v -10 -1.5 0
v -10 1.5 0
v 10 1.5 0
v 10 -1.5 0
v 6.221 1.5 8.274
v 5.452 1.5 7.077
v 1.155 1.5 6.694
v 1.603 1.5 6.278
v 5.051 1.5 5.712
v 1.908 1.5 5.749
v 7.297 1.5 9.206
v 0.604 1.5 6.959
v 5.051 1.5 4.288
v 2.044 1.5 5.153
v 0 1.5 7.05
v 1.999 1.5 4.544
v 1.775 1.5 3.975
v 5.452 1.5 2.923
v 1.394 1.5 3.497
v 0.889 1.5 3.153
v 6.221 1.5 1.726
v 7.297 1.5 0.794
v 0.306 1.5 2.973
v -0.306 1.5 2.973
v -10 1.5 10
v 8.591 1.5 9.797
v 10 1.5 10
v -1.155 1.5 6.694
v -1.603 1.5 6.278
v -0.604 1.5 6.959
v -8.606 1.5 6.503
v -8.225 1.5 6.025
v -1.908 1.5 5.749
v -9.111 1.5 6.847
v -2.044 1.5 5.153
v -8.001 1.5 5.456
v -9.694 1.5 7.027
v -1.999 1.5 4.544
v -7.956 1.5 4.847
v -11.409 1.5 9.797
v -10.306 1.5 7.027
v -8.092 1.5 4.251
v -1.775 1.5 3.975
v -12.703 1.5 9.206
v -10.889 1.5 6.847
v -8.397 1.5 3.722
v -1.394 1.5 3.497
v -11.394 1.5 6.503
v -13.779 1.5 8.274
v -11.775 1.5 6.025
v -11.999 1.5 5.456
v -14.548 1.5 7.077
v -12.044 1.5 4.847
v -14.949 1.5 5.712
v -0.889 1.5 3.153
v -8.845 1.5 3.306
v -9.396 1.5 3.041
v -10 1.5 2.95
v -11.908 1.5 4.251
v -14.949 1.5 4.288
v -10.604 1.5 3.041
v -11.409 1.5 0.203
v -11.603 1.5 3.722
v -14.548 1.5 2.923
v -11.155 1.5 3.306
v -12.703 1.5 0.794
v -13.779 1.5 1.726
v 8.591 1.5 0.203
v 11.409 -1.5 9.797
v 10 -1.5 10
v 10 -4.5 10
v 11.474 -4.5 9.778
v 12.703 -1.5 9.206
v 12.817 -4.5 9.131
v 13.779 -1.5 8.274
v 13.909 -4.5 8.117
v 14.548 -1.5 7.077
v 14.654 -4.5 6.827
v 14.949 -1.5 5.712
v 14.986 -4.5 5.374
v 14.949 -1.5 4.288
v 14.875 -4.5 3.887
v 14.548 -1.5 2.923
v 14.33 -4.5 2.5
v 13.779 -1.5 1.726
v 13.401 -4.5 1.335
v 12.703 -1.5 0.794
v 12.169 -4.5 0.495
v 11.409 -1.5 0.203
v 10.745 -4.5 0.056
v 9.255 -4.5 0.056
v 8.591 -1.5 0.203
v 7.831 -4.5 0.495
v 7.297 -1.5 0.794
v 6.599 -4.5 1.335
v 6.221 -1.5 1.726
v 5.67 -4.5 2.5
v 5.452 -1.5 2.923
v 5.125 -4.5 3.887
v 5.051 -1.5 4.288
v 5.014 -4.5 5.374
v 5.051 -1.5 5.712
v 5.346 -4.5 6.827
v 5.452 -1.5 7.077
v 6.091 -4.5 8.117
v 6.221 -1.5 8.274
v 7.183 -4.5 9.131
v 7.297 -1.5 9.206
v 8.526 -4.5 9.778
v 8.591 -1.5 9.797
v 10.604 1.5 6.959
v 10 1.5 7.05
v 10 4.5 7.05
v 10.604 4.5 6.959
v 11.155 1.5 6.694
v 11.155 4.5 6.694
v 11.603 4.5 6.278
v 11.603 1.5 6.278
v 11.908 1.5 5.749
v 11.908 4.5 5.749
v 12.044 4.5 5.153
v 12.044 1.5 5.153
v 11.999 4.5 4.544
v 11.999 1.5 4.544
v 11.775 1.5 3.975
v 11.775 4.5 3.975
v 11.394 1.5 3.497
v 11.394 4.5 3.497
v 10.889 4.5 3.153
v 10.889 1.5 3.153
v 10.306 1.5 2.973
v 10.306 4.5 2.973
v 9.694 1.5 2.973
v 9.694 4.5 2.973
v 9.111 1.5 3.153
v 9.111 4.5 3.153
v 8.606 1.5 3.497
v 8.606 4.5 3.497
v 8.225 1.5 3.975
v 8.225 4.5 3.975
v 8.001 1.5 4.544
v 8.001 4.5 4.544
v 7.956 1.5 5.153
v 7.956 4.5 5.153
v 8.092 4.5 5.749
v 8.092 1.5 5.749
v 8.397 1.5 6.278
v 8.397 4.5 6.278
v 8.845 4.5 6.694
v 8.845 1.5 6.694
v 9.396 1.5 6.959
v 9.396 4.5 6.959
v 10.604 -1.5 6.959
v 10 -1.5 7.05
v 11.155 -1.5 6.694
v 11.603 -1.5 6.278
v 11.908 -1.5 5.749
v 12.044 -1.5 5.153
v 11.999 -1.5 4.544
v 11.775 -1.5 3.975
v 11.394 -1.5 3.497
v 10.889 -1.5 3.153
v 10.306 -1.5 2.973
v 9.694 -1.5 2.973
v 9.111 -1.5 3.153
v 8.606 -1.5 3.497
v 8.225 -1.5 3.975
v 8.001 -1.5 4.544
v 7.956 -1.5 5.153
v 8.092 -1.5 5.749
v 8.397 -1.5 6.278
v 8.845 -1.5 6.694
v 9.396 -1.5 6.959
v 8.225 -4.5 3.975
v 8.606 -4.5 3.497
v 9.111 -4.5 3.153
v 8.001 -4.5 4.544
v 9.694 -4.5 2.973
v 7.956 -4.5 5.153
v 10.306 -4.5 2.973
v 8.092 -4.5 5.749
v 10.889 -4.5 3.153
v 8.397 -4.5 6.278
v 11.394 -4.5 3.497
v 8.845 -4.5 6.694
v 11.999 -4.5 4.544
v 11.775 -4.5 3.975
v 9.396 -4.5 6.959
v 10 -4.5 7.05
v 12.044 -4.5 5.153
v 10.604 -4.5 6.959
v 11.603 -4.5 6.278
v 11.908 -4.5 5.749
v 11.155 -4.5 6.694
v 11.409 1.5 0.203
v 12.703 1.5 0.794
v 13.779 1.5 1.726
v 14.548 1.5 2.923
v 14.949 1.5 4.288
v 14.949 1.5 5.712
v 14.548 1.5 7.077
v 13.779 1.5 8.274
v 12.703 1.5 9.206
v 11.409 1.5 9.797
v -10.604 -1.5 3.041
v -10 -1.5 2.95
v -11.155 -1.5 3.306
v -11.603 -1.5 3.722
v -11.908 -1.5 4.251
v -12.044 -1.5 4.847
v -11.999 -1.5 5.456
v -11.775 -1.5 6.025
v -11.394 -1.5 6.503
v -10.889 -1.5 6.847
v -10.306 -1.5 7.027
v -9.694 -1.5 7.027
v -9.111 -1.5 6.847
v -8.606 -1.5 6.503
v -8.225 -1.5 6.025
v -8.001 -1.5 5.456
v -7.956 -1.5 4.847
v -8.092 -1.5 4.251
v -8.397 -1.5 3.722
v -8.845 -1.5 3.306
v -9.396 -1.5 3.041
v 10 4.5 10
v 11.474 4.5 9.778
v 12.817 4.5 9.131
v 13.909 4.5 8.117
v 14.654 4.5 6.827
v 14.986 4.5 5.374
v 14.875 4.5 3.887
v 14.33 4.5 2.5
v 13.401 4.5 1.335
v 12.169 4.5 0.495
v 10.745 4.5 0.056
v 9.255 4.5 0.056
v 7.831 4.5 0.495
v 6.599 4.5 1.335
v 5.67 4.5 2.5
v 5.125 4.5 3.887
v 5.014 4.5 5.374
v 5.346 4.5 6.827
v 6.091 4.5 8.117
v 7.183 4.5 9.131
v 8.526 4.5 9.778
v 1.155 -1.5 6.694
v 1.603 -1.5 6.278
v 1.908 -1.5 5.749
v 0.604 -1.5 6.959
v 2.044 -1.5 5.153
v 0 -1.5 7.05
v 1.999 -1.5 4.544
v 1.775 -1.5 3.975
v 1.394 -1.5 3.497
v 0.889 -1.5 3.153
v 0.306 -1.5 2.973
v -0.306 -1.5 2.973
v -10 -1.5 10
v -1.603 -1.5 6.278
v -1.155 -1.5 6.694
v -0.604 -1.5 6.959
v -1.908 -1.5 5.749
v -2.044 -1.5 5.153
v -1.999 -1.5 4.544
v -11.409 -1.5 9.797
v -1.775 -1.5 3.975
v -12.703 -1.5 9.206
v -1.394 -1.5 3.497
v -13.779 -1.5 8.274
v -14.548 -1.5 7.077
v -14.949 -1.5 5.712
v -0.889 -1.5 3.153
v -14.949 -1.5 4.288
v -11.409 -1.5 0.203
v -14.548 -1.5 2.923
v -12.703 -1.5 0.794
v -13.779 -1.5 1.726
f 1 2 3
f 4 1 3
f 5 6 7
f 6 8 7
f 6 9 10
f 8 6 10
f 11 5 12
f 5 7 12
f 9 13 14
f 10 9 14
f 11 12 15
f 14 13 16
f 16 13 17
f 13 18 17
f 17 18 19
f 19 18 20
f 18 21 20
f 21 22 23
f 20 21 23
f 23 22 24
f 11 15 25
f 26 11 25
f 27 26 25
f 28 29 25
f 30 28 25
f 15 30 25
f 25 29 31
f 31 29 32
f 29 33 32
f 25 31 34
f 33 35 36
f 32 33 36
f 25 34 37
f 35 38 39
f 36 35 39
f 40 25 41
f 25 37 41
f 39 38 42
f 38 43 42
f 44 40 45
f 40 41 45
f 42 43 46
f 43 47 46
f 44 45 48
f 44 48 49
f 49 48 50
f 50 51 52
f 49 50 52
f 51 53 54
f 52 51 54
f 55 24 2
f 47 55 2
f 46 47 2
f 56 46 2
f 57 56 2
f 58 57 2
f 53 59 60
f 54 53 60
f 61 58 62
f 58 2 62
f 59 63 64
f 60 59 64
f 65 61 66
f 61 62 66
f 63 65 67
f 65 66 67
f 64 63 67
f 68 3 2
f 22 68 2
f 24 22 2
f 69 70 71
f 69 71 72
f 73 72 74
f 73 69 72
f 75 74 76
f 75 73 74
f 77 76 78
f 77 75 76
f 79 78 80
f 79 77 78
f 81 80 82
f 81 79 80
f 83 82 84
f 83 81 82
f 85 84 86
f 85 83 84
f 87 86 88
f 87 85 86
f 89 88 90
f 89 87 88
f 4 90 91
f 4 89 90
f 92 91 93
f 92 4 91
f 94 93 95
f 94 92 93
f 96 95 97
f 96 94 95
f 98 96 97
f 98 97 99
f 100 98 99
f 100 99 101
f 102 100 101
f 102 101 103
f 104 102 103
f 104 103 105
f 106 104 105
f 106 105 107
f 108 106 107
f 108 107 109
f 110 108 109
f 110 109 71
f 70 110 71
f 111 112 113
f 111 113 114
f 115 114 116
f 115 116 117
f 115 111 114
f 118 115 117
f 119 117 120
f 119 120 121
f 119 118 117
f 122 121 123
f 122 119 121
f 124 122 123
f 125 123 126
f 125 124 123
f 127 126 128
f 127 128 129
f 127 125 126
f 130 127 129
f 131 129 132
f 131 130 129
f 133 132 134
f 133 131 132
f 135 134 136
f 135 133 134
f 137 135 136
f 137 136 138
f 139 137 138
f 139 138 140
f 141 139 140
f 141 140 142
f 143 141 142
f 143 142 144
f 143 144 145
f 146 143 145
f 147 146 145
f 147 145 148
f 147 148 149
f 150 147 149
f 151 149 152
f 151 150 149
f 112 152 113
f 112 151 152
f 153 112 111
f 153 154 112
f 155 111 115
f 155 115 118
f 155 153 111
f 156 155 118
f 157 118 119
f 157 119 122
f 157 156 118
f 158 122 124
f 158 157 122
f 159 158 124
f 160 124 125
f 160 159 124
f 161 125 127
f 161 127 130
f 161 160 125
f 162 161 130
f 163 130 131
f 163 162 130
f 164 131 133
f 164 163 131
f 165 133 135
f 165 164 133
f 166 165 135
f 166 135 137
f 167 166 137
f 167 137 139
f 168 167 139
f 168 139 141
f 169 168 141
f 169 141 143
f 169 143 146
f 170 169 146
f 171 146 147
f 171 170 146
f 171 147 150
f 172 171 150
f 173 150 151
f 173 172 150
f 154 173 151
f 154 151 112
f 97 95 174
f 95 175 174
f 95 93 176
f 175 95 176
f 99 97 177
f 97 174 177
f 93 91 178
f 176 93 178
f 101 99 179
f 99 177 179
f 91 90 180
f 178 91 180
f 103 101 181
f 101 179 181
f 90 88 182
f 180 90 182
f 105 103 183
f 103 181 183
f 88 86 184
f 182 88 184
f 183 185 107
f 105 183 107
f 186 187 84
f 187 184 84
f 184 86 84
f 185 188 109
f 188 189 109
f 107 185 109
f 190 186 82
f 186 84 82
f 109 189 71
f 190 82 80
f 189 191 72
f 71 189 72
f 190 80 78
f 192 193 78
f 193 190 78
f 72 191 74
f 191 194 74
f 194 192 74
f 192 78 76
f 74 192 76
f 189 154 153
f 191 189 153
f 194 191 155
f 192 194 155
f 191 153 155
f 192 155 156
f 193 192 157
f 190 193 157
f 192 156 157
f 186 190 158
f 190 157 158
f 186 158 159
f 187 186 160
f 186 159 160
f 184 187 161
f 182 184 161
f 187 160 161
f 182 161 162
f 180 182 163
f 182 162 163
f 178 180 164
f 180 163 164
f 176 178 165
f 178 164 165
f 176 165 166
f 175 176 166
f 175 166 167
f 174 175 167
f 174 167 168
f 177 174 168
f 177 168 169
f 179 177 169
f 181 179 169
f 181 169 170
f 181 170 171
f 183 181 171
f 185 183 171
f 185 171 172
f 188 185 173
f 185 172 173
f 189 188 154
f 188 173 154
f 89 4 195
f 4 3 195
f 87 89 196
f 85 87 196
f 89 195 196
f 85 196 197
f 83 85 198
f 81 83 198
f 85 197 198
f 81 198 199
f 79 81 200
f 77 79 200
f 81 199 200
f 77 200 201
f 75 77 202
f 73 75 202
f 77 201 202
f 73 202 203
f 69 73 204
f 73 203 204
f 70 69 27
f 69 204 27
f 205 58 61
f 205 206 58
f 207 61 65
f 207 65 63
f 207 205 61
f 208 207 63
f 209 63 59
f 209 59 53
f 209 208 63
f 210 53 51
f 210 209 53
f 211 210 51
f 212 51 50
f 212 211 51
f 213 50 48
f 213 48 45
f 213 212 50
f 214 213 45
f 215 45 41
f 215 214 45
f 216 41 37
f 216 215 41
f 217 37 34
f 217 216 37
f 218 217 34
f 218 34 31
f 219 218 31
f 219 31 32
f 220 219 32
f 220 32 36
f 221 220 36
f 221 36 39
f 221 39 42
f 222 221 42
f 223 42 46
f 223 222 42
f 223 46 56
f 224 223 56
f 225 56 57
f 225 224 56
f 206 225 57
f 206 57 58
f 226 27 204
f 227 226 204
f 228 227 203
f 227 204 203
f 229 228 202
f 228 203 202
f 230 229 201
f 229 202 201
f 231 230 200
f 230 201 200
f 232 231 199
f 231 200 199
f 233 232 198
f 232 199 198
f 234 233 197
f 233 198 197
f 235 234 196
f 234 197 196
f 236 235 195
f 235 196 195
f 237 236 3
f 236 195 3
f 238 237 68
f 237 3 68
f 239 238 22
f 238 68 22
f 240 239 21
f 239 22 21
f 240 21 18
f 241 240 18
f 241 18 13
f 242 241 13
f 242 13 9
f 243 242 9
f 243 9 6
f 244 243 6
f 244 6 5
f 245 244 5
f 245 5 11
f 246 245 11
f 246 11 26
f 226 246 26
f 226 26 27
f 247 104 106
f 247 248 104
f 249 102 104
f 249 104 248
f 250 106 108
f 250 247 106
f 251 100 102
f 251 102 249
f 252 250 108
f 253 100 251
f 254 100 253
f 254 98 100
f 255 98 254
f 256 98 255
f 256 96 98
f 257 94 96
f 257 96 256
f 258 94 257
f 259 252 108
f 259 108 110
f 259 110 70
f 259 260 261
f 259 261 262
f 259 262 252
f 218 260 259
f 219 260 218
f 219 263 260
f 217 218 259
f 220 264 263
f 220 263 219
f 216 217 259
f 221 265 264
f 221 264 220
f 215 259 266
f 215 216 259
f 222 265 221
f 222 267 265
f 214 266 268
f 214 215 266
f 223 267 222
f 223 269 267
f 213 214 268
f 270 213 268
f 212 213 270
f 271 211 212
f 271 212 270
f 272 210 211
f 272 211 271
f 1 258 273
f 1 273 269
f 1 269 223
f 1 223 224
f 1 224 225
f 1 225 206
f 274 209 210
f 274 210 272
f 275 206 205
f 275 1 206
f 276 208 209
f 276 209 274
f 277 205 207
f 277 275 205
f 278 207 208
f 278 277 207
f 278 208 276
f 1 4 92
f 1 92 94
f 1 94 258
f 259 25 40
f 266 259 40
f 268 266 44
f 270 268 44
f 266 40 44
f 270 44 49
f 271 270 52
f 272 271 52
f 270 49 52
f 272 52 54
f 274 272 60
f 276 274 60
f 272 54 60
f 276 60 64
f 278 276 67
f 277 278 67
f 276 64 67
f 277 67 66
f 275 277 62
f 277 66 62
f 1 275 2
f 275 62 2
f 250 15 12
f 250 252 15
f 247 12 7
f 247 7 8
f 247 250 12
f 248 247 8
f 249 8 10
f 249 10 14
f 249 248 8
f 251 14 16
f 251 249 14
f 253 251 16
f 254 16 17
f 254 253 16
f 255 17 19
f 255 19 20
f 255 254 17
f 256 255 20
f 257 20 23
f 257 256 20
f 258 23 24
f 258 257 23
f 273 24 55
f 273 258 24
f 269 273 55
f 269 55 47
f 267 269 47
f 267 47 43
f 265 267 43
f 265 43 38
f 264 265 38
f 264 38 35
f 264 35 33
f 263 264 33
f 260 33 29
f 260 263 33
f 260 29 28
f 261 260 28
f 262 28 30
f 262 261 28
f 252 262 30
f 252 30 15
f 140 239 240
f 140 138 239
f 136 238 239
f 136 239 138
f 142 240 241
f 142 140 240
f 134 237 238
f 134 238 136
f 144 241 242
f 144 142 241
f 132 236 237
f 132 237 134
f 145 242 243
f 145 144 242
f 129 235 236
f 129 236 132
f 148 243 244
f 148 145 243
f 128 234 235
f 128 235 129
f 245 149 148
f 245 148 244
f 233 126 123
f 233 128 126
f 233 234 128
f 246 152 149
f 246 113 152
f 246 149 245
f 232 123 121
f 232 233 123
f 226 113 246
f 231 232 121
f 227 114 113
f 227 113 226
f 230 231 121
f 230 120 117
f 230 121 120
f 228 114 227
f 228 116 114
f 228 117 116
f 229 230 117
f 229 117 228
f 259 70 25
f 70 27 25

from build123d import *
from build123d.topology import SkipClean

# Parameters (mm, degrees)
SKETCH1_R           = 2.05
BOSS_EXTRUDE1_DEPTH = 1.5
SKETCH2_R           = 5
SKETCH2_R_2         = 2.05
BOSS_EXTRUDE2_DEPTH = 3


with BuildPart() as part:
    # Sketch1 → Boss-Extrude1 (new, symmetric)
    with BuildSketch(Plane(origin=(0, 0, 0), x_dir=(1, 0, 0), z_dir=(0, 1, 0))):
        with BuildLine():
            Line((-10, 0), (-5, 0))
            Line((-5, 0), (5, 0))
            Line((5, 0), (10, 0))
            ThreePointArc((10, 0), (15, -5), (10, -10))
            Line((10, -10), (5, -10))
            Line((5, -10), (-5, -10))
            Line((-5, -10), (-10, -10))
            ThreePointArc((-10, -10), (-15, -5), (-10, 0))
        make_face()
        with Locations(Location((10, -5, 0), (0, 0, 270))):
            Circle(SKETCH1_R, mode=Mode.SUBTRACT)
        with Locations(Location((-10, -5, 0), (0, 0, 90))):
            Circle(SKETCH1_R, mode=Mode.SUBTRACT)
        with Locations(Location((0, -5, 0), (0, 0, 270))):
            Circle(SKETCH1_R, mode=Mode.SUBTRACT)
    extrude(amount=BOSS_EXTRUDE1_DEPTH, both=True)

    # Sketch2 → Boss-Extrude2 (add)
    with BuildSketch(Plane(origin=(0, 1.5, 0), x_dir=(1, 0, 0), z_dir=(0, 1, 0))):
        with Locations(Location((10, -5, 0), (0, 0, 270))):
            Circle(SKETCH2_R)
        with Locations(Location((10, -5, 0), (0, 0, 270))):
            Circle(SKETCH2_R_2, mode=Mode.SUBTRACT)
    boss_extrude2 = extrude(amount=BOSS_EXTRUDE2_DEPTH)

    # Mirror1: Boss-Extrude2 across plane
    with SkipClean():  # the faces are left unmerged after this step: merging them gives an invalid solid
        add(boss_extrude2.mirror(Plane.ZX))


solid = part.part
